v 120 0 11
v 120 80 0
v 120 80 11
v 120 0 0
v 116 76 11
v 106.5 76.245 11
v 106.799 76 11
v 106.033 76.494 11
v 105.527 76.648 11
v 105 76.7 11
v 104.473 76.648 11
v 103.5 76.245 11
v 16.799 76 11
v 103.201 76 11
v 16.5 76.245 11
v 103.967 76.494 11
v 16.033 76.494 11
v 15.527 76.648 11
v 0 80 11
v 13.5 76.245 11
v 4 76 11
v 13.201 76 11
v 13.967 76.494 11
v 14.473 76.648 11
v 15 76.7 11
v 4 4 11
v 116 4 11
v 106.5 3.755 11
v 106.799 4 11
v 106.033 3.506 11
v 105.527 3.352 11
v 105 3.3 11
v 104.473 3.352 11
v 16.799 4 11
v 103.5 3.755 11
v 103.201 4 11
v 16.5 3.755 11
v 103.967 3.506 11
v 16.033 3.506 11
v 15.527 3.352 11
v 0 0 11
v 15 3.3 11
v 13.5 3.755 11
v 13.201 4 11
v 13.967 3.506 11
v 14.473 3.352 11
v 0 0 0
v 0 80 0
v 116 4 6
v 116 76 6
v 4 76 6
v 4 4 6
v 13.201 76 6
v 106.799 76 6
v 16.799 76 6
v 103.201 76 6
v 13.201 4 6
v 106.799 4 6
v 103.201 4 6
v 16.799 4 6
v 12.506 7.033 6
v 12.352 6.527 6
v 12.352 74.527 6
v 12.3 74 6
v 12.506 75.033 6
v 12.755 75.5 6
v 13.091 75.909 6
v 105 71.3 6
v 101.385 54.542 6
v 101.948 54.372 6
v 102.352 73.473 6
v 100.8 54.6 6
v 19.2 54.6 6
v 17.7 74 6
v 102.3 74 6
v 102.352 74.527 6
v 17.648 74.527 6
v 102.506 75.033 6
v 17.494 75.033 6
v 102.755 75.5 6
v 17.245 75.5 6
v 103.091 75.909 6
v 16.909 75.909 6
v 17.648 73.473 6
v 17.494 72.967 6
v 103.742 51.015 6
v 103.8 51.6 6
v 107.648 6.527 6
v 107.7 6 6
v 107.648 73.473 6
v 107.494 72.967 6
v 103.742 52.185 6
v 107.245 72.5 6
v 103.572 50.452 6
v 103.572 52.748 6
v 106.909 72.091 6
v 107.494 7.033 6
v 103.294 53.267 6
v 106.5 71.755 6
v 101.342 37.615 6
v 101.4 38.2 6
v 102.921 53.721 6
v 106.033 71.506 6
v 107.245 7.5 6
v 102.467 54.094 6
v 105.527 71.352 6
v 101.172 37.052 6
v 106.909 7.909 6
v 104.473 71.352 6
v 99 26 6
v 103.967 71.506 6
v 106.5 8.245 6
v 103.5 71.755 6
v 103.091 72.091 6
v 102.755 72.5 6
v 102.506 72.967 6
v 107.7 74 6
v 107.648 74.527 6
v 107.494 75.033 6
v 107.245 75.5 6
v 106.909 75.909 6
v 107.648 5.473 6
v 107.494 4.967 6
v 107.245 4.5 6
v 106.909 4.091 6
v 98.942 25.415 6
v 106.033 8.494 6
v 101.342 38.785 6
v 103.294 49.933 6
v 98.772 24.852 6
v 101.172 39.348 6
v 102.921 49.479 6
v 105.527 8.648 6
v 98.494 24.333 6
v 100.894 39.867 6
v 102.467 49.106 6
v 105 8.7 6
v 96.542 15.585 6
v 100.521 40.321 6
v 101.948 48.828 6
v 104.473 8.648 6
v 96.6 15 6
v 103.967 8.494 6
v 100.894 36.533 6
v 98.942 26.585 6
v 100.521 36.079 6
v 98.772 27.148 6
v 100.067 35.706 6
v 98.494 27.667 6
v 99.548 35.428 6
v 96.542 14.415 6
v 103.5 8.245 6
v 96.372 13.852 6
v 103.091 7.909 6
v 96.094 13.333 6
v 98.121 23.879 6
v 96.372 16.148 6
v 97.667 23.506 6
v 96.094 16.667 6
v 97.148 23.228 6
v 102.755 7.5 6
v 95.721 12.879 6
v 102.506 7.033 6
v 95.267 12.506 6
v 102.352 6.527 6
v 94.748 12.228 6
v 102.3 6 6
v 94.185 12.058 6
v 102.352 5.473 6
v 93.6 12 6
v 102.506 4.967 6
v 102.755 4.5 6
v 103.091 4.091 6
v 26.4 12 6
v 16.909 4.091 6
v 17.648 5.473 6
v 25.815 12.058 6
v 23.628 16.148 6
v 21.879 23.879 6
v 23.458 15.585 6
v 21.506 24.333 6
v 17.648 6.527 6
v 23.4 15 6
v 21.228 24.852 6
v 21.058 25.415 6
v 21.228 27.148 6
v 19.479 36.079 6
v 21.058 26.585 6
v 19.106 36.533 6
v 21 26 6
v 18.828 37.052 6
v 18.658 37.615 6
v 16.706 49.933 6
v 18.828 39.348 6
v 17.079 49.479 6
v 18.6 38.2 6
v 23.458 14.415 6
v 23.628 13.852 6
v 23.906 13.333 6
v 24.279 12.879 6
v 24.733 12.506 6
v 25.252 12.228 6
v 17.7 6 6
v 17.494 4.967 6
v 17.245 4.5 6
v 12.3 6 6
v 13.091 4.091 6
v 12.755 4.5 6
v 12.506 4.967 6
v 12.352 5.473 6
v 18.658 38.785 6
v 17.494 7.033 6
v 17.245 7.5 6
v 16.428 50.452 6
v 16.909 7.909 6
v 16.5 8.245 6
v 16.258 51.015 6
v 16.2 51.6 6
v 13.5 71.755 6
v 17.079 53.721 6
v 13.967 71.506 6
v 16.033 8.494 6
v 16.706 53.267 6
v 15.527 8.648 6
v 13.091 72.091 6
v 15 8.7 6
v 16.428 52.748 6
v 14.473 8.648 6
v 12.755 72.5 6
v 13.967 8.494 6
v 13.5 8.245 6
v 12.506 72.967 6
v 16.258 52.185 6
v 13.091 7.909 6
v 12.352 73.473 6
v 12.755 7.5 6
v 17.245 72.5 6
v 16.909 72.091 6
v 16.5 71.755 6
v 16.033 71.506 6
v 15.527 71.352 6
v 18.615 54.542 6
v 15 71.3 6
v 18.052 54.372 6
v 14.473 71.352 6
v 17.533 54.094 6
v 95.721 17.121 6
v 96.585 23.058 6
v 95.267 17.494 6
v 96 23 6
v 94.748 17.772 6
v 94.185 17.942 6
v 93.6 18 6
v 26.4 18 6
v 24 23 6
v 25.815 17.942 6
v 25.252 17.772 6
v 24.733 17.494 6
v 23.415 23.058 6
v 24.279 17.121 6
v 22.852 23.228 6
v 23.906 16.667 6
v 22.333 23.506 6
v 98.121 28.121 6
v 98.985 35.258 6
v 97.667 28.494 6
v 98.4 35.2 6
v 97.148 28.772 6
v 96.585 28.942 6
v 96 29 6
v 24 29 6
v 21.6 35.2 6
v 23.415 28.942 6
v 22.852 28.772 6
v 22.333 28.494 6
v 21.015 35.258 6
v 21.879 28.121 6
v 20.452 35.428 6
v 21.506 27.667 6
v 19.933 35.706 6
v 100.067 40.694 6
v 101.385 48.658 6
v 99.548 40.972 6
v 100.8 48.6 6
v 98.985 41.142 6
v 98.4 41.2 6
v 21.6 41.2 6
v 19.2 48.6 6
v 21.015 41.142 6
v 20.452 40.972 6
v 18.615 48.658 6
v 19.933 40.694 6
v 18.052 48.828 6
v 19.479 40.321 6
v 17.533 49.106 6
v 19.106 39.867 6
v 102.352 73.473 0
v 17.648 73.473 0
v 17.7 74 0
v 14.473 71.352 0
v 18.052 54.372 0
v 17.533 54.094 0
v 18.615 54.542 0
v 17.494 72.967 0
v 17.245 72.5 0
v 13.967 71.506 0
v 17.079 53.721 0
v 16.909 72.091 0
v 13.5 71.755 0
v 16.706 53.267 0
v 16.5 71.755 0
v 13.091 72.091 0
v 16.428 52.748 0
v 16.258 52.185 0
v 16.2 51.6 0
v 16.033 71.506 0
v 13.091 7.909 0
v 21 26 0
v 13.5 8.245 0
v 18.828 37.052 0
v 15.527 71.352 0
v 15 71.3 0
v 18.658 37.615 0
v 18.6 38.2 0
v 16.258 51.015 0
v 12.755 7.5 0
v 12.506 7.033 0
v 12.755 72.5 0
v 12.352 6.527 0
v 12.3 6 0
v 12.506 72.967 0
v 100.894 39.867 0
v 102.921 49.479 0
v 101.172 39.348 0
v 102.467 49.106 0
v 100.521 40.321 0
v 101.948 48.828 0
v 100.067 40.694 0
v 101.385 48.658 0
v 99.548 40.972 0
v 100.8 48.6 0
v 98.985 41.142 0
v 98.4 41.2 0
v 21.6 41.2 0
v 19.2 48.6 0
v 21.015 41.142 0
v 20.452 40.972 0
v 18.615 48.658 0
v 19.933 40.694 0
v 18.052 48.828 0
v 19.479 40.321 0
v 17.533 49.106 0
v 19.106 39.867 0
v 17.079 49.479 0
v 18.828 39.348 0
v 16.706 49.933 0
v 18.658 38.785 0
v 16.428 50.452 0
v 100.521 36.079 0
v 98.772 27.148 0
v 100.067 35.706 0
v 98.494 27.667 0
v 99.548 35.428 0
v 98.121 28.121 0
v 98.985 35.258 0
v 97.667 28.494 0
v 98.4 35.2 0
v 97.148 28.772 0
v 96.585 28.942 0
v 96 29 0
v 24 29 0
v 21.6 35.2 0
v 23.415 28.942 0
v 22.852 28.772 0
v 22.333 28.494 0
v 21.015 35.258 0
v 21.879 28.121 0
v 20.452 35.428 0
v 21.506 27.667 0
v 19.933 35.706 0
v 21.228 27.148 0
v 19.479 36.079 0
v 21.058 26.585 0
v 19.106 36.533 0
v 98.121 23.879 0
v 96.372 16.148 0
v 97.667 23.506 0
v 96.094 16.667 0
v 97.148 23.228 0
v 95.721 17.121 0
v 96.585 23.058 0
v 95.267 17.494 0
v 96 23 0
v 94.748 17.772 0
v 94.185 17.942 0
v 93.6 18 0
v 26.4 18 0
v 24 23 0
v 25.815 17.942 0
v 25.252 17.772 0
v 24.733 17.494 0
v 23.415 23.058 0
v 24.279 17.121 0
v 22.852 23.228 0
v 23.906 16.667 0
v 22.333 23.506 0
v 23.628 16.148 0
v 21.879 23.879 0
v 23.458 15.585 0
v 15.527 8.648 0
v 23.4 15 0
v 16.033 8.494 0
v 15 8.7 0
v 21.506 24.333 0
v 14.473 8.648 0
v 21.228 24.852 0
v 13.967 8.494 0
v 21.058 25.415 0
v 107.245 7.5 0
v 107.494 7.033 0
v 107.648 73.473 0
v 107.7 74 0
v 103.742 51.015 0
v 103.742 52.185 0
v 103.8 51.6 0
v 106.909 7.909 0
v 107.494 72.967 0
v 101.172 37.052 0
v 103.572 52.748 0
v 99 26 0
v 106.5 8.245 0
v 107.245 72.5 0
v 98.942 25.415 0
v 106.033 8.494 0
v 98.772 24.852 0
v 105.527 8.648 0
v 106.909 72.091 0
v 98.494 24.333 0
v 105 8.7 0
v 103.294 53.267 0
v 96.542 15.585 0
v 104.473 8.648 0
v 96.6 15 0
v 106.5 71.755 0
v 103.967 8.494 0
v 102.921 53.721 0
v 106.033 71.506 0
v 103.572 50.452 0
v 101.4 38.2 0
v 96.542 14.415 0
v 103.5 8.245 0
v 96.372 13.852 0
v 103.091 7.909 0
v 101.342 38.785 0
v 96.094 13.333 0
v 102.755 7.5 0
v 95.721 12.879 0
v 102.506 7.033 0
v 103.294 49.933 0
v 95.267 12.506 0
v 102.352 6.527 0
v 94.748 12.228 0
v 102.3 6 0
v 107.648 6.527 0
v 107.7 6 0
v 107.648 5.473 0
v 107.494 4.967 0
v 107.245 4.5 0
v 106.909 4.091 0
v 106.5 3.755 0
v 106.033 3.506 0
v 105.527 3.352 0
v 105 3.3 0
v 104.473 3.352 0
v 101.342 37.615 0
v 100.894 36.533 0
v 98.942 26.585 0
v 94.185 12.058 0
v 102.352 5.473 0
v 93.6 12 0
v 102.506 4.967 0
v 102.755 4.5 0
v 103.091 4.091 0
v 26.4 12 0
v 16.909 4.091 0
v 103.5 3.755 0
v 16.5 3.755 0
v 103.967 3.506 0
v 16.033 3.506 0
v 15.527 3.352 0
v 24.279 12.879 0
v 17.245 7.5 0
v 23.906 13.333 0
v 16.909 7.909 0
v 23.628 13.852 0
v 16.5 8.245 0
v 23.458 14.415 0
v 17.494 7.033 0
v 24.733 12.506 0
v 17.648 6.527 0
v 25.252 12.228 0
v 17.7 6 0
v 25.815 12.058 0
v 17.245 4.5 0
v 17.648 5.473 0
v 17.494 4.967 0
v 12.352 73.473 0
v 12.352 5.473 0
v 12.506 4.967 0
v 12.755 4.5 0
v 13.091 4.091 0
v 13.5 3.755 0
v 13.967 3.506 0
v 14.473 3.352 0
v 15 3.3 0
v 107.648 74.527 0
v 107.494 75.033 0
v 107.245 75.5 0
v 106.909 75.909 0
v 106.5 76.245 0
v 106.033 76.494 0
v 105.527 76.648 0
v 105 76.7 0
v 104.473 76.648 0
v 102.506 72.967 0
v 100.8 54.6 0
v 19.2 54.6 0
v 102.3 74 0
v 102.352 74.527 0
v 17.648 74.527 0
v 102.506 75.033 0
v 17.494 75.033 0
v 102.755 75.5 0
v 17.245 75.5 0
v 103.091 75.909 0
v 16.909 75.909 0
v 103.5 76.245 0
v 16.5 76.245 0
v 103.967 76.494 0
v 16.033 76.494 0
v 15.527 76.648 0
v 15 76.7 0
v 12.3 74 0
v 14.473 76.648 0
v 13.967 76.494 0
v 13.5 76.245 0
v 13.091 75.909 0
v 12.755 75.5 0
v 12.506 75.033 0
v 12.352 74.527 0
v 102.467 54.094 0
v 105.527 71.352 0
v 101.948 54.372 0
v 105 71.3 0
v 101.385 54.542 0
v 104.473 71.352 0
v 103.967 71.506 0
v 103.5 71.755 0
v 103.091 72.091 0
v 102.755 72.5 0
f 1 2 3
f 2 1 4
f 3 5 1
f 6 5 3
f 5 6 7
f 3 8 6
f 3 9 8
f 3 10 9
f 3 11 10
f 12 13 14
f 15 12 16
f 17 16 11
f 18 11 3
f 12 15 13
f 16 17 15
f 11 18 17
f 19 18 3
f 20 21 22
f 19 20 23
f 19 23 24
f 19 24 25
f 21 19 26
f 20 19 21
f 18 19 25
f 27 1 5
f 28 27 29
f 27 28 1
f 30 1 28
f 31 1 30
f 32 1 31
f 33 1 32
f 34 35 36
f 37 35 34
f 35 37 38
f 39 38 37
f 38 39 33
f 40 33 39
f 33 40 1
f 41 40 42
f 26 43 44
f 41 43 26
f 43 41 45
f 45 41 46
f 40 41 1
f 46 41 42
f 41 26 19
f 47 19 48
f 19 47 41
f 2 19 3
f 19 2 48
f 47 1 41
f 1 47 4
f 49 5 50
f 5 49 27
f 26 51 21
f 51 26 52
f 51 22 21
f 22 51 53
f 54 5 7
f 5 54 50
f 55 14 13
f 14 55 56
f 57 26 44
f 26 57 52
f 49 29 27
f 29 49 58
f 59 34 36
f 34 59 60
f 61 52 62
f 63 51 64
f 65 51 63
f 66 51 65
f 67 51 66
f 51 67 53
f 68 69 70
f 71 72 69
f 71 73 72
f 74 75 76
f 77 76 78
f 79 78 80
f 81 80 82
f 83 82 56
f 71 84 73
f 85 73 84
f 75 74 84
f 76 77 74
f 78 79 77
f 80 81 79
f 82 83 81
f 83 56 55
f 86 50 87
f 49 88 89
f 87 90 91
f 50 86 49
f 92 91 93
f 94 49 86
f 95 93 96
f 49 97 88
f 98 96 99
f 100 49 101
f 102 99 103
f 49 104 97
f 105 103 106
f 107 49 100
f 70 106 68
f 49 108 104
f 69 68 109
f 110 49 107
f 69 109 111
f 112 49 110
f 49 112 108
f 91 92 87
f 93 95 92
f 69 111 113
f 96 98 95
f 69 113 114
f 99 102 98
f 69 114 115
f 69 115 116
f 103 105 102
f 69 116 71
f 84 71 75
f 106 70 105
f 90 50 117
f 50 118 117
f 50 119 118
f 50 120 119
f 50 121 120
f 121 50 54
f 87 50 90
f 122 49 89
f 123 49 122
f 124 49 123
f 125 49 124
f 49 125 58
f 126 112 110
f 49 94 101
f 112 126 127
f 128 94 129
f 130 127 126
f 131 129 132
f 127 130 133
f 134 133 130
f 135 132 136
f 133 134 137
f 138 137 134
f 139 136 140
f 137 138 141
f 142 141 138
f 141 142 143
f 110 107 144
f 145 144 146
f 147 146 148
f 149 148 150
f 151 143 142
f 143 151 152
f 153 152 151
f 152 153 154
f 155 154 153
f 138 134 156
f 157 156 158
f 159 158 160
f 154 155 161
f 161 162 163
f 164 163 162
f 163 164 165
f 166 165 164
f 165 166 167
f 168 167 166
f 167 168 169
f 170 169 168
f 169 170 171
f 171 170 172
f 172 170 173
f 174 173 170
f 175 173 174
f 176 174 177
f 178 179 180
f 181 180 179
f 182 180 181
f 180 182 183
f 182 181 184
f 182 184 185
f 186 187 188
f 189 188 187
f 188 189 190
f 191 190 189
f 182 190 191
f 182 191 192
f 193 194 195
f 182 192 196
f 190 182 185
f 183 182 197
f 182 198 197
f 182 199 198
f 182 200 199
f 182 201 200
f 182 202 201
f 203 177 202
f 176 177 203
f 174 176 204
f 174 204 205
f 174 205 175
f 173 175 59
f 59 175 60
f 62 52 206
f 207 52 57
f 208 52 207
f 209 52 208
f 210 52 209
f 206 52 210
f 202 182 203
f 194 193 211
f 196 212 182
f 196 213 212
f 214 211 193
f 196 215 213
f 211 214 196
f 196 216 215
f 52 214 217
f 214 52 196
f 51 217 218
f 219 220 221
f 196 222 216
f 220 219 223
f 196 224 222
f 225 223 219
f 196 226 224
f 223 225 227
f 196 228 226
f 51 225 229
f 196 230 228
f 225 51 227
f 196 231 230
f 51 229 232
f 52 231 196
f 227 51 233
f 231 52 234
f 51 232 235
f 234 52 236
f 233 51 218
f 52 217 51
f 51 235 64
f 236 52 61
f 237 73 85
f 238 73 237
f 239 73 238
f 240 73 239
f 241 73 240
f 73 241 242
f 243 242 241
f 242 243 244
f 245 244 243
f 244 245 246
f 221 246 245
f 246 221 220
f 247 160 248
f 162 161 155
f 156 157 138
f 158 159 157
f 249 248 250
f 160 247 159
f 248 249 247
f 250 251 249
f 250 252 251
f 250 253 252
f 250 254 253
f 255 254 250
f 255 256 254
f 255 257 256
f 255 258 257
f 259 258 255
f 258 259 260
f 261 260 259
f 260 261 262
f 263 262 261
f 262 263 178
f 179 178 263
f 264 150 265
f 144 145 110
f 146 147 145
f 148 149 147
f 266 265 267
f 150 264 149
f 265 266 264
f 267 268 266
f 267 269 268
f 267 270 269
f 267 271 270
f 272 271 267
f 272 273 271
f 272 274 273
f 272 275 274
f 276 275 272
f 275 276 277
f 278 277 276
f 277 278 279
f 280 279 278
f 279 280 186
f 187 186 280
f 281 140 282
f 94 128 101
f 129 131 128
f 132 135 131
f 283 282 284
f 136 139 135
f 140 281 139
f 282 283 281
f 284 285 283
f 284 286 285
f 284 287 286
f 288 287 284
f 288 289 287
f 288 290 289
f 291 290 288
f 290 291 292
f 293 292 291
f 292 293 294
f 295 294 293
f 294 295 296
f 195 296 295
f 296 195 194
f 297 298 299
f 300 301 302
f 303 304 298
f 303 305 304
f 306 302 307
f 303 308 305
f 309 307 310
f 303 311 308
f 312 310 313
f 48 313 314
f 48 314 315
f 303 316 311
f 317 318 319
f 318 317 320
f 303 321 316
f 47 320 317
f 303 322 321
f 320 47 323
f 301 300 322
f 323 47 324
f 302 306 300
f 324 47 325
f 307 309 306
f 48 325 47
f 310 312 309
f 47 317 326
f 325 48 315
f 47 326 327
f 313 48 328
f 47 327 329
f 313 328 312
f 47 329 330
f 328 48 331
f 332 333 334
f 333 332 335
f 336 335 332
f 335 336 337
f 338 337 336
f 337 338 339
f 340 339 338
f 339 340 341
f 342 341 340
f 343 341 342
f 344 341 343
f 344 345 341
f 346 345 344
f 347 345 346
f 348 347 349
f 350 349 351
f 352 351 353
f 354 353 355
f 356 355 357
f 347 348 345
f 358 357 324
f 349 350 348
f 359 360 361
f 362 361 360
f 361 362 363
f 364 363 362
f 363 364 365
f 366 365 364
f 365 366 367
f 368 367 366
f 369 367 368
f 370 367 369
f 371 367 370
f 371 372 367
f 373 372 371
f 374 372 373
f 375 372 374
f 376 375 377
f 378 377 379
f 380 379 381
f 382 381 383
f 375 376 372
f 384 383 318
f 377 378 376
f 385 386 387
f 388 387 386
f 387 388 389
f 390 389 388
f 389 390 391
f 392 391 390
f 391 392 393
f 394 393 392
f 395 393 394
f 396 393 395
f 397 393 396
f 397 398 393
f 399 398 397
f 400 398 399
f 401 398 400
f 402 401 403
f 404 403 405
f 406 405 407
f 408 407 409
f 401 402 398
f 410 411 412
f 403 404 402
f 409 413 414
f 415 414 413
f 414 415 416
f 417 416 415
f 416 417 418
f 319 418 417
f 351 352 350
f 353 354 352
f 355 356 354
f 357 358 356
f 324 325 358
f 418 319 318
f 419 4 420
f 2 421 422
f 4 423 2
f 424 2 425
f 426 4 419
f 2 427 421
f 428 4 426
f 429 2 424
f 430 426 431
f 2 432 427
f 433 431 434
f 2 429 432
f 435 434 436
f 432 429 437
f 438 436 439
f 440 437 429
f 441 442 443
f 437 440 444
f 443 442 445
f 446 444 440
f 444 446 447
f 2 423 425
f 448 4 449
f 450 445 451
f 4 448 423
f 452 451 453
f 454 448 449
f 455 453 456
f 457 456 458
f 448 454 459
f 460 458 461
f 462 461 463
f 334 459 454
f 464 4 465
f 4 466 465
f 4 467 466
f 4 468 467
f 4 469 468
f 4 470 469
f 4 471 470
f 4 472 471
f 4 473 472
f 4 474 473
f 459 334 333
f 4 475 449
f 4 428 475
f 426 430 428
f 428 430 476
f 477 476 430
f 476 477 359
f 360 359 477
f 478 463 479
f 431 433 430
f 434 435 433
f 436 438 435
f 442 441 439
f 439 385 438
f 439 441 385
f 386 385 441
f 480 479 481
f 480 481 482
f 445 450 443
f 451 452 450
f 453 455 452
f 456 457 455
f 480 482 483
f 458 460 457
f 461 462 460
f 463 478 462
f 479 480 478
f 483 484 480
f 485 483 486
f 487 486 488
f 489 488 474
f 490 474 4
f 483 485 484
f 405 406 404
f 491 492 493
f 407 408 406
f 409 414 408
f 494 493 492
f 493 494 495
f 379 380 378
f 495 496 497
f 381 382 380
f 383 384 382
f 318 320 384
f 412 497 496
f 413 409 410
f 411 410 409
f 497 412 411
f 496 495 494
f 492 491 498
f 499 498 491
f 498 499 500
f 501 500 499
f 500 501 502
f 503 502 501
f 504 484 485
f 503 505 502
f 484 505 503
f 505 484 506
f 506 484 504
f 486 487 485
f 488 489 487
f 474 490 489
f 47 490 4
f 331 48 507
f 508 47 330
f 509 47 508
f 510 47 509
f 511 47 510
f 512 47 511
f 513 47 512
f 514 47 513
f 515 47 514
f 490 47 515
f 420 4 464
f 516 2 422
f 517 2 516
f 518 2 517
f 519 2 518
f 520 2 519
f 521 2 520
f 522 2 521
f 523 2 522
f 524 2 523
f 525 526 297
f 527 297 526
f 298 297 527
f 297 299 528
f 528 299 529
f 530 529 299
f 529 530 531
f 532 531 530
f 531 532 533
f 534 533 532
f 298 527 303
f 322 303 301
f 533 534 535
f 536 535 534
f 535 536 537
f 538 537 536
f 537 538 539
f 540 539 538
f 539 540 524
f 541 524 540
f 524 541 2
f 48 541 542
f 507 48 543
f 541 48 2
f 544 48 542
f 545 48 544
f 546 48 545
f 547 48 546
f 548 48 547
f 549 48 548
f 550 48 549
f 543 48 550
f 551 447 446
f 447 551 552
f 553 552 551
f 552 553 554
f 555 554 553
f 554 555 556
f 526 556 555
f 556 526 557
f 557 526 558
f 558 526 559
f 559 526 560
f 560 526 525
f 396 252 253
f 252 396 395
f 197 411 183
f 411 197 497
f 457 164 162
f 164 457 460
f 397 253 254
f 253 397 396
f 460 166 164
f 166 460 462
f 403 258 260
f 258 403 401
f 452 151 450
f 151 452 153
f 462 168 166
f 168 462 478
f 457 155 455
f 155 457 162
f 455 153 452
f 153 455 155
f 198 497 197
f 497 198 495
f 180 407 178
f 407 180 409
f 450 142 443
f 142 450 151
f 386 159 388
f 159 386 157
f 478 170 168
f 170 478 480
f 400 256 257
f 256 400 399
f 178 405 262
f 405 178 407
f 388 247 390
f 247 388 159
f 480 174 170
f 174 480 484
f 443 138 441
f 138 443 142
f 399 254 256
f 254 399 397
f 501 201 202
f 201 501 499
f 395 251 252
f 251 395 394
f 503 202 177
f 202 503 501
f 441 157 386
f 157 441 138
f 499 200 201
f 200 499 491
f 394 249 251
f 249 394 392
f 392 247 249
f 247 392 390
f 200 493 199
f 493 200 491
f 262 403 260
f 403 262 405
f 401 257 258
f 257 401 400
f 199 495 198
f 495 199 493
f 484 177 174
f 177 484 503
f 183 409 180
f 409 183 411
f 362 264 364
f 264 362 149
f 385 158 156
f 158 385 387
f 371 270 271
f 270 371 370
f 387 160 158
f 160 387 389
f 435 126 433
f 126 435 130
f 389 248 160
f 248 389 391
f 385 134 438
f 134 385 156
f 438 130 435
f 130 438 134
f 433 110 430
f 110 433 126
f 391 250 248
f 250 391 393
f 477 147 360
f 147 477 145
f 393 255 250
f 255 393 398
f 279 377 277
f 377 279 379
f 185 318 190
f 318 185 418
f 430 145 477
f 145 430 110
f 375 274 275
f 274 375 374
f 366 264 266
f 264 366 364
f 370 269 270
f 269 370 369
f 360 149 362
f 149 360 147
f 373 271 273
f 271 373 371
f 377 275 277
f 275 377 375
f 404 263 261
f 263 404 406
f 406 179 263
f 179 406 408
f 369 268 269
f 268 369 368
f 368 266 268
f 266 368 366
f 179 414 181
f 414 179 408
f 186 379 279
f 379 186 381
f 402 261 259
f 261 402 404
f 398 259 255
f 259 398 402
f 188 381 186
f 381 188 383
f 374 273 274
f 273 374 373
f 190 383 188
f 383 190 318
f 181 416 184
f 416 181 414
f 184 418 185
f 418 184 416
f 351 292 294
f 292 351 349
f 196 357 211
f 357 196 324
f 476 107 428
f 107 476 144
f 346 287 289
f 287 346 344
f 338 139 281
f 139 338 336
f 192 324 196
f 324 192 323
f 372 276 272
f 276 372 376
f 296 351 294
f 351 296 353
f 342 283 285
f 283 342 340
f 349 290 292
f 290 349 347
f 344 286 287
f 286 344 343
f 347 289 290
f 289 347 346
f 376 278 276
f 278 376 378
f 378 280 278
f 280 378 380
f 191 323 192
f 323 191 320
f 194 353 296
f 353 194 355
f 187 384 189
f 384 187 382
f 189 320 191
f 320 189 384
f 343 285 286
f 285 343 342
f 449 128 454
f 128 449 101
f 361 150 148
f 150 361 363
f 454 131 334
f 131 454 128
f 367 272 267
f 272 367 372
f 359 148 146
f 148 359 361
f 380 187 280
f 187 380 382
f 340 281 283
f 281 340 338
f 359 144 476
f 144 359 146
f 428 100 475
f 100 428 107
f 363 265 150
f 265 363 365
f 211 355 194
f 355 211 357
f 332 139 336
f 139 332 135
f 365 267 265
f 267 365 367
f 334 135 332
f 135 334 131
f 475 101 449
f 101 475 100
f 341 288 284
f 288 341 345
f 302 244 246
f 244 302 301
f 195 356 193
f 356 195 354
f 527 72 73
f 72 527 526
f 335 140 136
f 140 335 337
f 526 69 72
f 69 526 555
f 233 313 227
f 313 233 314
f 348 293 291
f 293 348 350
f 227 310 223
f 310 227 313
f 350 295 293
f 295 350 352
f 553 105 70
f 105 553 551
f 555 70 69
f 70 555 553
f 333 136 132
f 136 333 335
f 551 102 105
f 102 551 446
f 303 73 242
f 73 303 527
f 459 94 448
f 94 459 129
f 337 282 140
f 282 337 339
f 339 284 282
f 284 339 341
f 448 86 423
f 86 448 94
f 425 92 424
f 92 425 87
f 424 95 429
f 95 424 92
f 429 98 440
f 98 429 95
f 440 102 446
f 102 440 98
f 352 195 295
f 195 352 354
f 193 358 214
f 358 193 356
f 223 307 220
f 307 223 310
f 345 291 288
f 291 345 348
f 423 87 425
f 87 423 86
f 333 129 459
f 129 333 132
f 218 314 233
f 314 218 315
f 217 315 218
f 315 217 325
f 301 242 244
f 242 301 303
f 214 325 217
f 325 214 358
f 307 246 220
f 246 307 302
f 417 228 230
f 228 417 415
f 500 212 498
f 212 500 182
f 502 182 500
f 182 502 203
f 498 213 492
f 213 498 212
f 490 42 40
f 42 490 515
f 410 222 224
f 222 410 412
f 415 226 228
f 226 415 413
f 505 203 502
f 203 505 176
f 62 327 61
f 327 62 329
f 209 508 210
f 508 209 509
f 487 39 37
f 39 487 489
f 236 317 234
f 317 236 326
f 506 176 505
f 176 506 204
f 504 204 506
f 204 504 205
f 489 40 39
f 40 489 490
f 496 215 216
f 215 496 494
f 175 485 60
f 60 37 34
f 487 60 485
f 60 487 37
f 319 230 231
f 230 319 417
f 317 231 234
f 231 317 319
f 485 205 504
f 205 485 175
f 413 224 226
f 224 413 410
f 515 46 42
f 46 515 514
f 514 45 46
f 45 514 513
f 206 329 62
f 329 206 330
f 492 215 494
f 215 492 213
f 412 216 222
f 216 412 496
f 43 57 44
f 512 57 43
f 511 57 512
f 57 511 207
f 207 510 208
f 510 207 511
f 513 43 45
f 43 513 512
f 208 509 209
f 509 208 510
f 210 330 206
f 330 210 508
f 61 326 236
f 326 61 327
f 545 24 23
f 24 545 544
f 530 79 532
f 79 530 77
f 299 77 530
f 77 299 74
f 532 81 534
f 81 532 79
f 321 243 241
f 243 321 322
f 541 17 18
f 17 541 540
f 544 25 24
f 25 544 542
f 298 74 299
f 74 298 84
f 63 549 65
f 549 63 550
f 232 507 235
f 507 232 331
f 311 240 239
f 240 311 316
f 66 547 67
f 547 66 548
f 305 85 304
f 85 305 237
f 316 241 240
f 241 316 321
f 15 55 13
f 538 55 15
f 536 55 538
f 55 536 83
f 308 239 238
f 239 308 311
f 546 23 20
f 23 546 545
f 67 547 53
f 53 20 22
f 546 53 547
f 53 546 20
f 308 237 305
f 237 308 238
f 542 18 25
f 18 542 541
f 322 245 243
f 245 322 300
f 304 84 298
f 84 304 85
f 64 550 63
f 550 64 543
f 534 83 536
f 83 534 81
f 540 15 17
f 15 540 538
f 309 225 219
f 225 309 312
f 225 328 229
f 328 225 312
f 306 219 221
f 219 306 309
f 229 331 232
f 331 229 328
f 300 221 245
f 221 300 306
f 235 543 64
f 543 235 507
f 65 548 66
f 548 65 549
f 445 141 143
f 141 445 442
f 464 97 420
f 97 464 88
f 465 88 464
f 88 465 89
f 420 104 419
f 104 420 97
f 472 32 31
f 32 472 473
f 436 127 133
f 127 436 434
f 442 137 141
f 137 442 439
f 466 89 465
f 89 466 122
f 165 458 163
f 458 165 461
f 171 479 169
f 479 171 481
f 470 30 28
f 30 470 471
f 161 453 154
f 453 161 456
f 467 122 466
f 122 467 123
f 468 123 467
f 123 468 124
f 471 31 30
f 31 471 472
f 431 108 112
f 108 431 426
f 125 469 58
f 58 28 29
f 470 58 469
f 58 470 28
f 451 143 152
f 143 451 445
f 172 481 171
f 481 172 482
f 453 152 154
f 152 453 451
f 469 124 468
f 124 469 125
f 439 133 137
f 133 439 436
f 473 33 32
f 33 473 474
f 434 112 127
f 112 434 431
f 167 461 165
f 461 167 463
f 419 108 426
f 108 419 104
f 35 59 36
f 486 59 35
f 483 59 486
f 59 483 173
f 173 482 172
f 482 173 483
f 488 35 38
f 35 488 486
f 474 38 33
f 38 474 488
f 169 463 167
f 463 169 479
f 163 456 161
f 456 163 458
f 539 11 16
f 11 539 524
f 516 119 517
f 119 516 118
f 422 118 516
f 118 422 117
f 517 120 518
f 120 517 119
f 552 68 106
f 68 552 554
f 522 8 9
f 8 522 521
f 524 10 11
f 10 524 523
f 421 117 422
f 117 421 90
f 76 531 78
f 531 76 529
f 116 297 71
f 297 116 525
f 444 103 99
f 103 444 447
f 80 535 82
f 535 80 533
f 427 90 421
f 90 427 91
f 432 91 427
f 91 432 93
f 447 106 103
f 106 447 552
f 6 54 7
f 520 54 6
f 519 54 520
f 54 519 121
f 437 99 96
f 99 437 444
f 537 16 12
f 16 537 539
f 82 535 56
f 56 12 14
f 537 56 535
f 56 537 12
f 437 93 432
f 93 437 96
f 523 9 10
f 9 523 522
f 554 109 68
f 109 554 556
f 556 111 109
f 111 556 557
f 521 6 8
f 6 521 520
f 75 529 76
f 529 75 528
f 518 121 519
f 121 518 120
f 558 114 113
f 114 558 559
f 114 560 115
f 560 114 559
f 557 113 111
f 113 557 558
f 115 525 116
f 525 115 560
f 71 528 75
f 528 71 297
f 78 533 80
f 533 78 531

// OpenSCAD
$fn = 32;

// ----------------------------------------------------------------------
// Slotted panel: 120 x 80 mm, 4 ряда of slots
// ----------------------------------------------------------------------

// --- parameters (mm) ---
panel_w = 120;            // panel width
panel_d = 80;             // panel depth
thick = 6;                // panel thickness
slot_w = 6;               // slot width
pitch0 = 11;              // first row pitch
pitch_step = 1.2;         // pitch increase per row
margin = 12;              // margin around the slot field
rows = 4;                 // number of slot rows
mount_d = 5.4;            // mounting holes
mount_x = 45;             // mounting hole offset
rim_h = 11;               // rim height
rim_t = 4;                // rim wall thickness

difference() {
  union() {
    cube([panel_w, panel_d, thick]);
    translate([0, 0, thick - 1]) difference() {
      cube([panel_w, panel_d, rim_h - thick + 1]);
      translate([rim_t, rim_t, -2.5]) cube([panel_w - 2 * rim_t, panel_d - 2 * rim_t, rim_h - thick + 6]);
    }
  }
  /* slot rows: stadium shaped cutters, 2.5 mm clear of both faces */
  /* row 0: pitch 11, length 67.2 */
  hull() {
    translate([26.4, 15, -2.5]) cylinder(h = thick + 5, d = slot_w);
    translate([93.6, 15, -2.5]) cylinder(h = thick + 5, d = slot_w);
  }
  /* row 1: pitch 12.2, length 72 */
  hull() {
    translate([24, 26, -2.5]) cylinder(h = thick + 5, d = slot_w);
    translate([96, 26, -2.5]) cylinder(h = thick + 5, d = slot_w);
  }
  /* row 2: pitch 13.4, length 76.8 */
  hull() {
    translate([21.6, 38.2, -2.5]) cylinder(h = thick + 5, d = slot_w);
    translate([98.4, 38.2, -2.5]) cylinder(h = thick + 5, d = slot_w);
  }
  /* row 3: pitch 14.6, length 81.6 */
  hull() {
    translate([19.2, 51.6, -2.5]) cylinder(h = thick + 5, d = slot_w);
    translate([100.8, 51.6, -2.5]) cylinder(h = thick + 5, d = slot_w);
  }
  translate([15, 6, -2.5]) cylinder(h = 16, d = mount_d);
  translate([15, 74, -2.5]) cylinder(h = 16, d = mount_d);
  translate([105, 6, -2.5]) cylinder(h = 16, d = mount_d);
  translate([105, 74, -2.5]) cylinder(h = 16, d = mount_d);
}
